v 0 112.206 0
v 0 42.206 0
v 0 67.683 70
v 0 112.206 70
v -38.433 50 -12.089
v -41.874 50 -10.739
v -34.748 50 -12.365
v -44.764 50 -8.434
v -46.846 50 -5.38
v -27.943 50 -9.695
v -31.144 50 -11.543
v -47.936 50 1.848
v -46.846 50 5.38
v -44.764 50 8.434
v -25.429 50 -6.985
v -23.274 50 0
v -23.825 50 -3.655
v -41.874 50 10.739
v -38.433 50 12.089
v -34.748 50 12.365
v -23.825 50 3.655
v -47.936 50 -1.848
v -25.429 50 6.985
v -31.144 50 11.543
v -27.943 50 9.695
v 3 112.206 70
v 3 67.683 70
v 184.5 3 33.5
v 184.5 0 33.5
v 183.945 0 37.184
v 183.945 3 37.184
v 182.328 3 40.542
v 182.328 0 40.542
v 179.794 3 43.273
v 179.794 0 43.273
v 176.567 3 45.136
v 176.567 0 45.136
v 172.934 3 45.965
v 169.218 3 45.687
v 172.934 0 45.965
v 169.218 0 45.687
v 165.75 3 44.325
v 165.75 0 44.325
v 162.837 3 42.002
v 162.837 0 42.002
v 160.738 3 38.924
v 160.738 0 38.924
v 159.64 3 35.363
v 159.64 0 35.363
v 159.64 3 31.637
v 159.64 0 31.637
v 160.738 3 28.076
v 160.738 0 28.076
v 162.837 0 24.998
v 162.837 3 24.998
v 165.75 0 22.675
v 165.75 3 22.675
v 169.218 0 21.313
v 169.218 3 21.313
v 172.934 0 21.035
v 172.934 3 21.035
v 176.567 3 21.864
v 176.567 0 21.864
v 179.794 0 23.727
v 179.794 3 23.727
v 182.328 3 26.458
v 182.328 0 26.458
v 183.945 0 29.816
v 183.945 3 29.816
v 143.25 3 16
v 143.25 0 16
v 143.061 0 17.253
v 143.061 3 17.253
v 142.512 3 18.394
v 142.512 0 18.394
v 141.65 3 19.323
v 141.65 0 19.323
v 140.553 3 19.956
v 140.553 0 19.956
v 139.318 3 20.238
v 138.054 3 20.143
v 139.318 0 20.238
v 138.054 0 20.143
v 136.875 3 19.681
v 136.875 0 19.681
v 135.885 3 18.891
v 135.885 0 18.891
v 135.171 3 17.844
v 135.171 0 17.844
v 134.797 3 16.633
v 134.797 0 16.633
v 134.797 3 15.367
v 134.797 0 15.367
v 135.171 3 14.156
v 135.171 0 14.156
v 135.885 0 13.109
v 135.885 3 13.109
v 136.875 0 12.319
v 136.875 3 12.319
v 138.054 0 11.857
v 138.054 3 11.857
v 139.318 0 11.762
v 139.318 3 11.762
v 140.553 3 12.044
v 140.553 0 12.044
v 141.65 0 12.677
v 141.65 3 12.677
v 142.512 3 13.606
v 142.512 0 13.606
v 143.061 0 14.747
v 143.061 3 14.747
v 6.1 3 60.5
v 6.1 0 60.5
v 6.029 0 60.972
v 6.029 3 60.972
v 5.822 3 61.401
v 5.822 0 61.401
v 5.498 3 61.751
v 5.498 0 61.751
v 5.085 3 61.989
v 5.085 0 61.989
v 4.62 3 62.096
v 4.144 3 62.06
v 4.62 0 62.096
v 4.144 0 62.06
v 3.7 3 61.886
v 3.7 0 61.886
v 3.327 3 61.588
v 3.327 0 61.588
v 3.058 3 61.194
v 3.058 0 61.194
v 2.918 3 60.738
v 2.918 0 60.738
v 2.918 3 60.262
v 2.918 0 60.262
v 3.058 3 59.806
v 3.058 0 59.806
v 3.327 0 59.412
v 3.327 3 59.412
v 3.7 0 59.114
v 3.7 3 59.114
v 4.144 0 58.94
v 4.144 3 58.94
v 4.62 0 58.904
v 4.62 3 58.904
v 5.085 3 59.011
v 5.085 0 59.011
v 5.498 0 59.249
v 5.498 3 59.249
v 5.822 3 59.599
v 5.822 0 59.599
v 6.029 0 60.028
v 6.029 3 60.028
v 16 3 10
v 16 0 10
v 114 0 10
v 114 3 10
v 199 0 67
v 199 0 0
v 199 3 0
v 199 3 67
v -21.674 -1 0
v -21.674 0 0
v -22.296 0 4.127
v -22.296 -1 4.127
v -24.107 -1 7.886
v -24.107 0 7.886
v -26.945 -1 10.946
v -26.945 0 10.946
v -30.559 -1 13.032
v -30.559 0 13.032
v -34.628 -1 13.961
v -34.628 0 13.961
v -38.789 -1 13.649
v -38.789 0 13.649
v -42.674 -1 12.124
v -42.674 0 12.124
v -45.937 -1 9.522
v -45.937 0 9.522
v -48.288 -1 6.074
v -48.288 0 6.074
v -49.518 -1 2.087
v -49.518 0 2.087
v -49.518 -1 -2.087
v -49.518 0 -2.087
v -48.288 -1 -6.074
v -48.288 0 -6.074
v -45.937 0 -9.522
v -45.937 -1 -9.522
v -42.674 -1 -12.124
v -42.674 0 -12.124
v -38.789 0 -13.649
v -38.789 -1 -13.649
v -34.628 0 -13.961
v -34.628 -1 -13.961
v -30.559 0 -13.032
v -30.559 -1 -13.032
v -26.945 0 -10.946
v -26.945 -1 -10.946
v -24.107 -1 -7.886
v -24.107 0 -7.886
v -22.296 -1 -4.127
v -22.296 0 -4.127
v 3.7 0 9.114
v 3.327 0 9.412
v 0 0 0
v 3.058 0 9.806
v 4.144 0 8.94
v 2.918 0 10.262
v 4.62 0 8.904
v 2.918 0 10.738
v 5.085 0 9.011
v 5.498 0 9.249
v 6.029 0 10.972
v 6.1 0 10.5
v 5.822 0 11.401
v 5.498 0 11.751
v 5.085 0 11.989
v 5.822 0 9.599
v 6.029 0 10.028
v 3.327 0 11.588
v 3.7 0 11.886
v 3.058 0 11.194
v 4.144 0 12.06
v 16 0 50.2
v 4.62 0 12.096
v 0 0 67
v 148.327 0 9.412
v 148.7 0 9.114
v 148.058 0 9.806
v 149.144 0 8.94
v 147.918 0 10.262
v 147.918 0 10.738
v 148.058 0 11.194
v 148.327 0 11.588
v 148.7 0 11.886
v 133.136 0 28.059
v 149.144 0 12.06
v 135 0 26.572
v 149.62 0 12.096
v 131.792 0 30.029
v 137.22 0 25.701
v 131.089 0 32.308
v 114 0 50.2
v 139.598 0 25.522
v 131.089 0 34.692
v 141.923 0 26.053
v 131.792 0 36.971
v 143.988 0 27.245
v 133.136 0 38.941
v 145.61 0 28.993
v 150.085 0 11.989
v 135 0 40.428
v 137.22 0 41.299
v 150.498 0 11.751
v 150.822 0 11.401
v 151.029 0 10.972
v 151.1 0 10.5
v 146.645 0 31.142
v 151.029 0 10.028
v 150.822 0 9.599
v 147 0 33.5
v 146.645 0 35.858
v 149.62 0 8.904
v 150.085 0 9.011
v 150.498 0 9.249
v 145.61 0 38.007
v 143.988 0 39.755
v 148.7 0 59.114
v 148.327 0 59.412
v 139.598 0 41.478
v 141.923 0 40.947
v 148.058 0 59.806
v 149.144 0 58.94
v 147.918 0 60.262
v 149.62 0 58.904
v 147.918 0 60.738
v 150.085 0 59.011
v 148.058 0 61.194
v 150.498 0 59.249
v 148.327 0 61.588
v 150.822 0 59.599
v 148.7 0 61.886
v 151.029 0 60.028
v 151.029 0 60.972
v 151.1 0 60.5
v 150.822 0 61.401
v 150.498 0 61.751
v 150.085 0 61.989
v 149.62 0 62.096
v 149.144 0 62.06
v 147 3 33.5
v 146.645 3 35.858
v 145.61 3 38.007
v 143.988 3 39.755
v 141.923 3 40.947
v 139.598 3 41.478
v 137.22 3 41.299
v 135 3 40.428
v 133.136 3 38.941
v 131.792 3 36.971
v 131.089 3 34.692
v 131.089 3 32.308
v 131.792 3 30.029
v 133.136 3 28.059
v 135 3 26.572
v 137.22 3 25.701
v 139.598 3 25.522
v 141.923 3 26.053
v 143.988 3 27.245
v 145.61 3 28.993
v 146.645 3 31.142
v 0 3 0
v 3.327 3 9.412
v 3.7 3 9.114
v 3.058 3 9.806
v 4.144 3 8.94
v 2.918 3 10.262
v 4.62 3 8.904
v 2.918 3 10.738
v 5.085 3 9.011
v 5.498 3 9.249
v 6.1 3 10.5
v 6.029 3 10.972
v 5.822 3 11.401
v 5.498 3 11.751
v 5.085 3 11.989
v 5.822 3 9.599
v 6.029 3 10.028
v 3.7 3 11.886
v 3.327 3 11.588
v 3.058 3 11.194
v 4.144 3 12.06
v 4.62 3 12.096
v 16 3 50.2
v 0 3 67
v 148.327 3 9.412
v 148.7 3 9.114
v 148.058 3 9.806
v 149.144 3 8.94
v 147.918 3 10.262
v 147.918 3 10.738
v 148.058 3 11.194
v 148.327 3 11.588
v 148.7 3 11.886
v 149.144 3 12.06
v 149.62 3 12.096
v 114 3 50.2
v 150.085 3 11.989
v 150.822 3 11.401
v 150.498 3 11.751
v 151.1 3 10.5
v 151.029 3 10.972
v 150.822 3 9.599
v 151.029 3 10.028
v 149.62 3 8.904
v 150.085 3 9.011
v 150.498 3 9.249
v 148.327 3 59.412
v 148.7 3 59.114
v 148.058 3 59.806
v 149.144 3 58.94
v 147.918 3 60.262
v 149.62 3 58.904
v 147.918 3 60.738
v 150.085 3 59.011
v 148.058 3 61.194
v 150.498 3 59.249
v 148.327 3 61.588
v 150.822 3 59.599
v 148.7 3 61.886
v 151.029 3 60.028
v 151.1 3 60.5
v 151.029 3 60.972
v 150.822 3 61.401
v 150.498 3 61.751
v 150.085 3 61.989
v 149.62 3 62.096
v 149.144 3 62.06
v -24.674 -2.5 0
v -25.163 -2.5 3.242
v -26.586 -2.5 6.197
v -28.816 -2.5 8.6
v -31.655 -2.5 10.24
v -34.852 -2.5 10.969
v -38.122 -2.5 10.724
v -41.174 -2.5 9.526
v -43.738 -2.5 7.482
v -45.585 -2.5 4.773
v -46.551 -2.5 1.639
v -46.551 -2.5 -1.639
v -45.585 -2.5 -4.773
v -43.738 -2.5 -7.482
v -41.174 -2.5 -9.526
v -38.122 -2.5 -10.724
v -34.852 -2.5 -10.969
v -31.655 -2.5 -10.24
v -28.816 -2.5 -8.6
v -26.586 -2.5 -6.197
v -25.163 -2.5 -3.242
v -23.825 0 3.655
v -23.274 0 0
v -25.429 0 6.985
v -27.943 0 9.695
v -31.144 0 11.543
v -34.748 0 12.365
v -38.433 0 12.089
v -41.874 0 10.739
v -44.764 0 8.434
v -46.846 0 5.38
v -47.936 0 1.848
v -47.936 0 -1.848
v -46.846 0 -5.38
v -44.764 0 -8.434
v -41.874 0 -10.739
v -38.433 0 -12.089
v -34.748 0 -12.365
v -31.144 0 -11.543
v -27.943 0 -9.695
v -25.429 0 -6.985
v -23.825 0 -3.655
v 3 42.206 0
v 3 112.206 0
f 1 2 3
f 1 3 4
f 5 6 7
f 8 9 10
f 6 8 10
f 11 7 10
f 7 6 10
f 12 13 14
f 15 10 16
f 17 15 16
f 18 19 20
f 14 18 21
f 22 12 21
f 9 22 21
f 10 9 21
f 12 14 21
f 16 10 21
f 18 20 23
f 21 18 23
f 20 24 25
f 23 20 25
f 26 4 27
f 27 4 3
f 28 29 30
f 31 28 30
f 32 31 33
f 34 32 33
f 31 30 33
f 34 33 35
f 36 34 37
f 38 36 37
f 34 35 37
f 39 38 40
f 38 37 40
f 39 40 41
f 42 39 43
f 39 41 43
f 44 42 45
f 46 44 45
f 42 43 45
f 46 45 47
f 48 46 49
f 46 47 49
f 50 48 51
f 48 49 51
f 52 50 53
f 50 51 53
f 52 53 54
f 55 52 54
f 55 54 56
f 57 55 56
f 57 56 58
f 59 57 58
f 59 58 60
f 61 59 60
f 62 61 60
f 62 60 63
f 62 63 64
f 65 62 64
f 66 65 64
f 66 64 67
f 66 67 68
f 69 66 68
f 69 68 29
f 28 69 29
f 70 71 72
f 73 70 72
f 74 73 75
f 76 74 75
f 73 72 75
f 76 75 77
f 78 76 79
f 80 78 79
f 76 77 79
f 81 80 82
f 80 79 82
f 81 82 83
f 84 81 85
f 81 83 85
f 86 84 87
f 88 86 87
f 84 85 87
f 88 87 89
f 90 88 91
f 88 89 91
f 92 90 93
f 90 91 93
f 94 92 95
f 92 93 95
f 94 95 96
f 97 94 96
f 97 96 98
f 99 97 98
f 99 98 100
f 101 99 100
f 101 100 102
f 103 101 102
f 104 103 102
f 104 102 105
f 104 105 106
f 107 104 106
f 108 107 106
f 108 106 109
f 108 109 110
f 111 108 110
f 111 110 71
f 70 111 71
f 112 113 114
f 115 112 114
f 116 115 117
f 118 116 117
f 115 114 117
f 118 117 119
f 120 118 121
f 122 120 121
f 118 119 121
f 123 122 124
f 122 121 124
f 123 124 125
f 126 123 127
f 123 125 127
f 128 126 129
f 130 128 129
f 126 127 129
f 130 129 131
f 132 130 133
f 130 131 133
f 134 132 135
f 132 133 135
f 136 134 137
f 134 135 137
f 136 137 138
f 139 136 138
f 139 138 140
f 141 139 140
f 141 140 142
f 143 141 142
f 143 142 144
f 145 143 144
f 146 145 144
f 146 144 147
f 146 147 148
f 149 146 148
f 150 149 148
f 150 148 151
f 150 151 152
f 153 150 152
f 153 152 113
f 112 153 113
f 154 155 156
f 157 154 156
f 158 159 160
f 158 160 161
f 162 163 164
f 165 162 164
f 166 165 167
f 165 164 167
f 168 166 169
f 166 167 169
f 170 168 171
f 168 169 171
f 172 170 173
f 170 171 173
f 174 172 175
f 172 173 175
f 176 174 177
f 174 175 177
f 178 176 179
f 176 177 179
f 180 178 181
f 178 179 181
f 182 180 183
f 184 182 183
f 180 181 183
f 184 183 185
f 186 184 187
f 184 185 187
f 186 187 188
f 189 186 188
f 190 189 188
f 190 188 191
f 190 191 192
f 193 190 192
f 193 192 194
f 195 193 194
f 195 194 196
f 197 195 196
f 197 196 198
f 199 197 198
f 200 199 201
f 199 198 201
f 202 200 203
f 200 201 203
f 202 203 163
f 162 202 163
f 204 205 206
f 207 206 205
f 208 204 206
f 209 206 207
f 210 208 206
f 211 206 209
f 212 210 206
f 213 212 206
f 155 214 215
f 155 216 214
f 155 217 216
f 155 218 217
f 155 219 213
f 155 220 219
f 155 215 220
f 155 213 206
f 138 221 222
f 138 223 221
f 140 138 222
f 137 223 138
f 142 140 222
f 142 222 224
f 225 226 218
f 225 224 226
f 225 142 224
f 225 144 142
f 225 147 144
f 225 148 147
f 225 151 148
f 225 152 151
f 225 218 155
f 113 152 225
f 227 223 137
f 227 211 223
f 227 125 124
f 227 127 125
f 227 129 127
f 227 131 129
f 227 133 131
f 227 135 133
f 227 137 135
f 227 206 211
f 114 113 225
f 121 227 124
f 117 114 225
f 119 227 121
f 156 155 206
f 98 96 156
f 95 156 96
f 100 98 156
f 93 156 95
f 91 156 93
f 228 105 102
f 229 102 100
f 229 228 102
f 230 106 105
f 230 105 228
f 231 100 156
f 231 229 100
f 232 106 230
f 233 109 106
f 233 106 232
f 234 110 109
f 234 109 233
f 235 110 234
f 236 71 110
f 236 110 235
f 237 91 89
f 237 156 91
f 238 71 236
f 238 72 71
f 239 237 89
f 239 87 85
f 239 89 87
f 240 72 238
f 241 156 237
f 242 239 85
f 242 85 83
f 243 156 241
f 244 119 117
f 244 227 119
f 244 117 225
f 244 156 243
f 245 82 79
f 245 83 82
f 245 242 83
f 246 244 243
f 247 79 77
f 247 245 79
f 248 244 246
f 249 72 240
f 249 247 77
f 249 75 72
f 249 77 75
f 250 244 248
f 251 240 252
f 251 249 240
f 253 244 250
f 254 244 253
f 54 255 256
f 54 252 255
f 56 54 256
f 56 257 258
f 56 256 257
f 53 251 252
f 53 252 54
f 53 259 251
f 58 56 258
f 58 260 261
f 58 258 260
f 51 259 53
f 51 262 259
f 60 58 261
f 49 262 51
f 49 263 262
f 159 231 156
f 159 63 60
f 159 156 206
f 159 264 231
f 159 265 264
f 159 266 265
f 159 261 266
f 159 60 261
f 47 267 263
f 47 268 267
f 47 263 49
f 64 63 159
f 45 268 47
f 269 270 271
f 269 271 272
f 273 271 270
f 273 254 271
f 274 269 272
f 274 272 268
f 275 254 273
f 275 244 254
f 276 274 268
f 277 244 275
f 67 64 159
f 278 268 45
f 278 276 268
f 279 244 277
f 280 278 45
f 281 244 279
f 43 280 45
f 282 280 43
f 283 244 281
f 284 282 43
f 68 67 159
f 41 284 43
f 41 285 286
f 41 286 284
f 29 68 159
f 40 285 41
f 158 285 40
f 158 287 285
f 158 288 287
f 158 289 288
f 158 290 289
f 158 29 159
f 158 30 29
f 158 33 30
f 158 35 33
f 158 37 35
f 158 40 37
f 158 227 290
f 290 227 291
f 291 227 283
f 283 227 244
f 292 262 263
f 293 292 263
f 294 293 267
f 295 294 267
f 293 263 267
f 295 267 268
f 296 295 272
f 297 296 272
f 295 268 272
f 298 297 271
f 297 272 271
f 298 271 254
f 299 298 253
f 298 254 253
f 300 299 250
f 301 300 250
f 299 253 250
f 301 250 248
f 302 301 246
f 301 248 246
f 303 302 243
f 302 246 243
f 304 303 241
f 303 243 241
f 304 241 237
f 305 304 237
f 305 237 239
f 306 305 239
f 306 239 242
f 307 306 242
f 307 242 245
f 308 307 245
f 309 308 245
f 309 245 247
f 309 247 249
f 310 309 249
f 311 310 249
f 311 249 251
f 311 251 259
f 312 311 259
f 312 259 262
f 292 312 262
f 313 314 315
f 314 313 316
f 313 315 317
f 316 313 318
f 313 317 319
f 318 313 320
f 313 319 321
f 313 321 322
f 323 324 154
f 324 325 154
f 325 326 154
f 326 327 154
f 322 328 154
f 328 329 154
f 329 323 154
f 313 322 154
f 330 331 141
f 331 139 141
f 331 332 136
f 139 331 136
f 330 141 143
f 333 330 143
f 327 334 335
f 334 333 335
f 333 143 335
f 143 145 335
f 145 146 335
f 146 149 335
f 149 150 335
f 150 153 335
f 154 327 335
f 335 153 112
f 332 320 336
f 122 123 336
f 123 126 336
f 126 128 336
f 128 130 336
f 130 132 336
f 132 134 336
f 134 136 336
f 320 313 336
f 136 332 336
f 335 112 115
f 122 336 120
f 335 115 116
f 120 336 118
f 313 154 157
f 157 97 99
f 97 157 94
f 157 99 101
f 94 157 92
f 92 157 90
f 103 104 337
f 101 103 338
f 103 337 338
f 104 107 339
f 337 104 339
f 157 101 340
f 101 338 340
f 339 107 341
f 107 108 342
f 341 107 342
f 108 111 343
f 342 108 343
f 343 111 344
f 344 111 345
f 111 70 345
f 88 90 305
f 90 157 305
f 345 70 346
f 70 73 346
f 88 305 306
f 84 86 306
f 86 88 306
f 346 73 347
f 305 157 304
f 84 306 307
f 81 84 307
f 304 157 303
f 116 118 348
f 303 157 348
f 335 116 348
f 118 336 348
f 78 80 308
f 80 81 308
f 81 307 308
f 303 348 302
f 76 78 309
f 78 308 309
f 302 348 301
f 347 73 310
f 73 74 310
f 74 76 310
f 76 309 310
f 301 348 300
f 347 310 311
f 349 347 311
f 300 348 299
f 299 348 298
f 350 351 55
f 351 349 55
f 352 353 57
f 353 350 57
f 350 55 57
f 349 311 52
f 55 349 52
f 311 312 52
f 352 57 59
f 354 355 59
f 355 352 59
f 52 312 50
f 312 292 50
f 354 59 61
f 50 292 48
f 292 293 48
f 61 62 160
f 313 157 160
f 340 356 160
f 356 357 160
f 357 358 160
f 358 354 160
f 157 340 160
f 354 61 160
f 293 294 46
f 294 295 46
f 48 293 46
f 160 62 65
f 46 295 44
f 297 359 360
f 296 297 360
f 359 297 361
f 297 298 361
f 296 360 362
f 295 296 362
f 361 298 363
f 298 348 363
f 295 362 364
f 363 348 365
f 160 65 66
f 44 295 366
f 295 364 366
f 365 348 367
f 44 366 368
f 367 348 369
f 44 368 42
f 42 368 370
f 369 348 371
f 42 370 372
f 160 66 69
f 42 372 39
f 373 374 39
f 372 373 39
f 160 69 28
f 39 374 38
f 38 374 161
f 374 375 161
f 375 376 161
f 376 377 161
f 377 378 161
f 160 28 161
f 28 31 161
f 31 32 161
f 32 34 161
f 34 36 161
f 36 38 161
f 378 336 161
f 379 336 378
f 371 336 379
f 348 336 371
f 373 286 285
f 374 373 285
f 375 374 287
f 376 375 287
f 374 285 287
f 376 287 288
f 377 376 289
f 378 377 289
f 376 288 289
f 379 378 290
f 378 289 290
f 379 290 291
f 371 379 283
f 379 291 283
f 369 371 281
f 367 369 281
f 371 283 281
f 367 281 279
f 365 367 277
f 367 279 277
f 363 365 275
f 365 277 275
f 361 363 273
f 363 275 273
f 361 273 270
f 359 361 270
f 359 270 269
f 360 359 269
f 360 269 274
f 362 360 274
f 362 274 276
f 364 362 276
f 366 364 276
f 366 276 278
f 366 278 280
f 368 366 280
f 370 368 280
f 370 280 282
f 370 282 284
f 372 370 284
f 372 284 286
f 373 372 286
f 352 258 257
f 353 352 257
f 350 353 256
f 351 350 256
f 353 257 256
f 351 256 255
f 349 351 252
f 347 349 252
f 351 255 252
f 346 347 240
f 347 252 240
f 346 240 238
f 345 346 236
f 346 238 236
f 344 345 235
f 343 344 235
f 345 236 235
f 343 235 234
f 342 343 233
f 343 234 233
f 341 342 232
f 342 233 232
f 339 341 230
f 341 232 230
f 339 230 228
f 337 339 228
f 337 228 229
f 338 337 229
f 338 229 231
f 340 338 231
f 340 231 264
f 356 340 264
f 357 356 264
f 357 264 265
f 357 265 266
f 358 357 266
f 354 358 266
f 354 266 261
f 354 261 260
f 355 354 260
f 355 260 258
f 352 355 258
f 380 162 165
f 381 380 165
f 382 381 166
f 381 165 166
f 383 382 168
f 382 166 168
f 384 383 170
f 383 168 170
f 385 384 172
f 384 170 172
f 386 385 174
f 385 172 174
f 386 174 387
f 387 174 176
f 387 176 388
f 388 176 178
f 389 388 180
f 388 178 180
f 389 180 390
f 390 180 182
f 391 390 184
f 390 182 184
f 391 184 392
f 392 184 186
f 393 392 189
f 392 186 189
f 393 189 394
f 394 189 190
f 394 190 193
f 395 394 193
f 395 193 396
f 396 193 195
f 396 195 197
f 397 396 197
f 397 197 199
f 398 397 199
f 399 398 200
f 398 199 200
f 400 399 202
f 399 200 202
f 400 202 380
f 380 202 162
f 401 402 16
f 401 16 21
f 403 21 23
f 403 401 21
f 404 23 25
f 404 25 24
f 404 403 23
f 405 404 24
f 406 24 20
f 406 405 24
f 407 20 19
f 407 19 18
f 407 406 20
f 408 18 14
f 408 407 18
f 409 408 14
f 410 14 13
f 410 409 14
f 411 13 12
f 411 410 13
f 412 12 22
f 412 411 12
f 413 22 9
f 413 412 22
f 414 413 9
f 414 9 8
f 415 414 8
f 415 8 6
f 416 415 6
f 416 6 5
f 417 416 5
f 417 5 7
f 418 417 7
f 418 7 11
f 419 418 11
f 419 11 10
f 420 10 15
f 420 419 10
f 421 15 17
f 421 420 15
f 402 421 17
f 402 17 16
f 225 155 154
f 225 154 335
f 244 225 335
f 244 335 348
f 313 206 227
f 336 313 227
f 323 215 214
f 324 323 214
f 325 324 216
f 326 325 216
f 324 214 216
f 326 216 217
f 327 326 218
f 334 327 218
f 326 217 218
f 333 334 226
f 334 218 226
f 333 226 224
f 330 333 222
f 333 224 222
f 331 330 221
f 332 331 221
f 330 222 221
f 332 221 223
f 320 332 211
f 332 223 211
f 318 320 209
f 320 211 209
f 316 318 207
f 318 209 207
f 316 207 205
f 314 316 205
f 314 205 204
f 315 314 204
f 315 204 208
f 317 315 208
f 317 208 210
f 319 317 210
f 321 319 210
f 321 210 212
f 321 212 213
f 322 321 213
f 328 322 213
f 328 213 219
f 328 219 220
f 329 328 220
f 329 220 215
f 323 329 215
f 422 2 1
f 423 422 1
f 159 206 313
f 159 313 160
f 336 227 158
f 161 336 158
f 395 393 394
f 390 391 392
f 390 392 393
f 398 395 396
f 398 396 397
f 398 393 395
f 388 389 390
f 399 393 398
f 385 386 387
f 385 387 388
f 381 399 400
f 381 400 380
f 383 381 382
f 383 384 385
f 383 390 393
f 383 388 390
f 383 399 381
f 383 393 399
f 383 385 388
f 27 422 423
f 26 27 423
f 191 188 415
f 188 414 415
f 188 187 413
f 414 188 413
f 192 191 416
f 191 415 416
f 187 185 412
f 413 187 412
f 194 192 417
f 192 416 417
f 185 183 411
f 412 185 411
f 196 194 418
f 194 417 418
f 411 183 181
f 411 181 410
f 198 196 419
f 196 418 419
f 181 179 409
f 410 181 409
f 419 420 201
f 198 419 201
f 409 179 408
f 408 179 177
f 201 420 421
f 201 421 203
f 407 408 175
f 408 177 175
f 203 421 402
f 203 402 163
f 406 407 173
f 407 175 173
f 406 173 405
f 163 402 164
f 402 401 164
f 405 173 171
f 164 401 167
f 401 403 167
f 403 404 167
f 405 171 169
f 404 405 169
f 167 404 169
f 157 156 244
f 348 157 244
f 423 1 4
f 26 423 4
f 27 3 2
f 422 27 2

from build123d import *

# Parameters (mm, degrees)
F0_W      = 199
F0_H      = 67
F1_DEPTH  = 3
F2_R      = 1.6
F3_DEPTH  = 3.001
F4_W      = 98
F4_H      = 40.2
F5_DEPTH  = 3.001
F6_R      = 4.25
F6_R_2    = 8
F7_DEPTH  = 3.001
F8_R      = 12.5
F9_DEPTH  = 3.001
F10_R     = 12.4
F11_DEPTH = 50
F12_R     = 14
F13_DEPTH = 2.5
F14_SIZE2 = 1.5
F14_SIZE  = 3
F16_DEPTH = 3


with BuildPart() as f1:
    # F0 (on Front) → F1 (new body)
    with BuildSketch(Plane.XZ):
        with Locations((99.5, 33.5)):
            Rectangle(F0_W, F0_H)
    extrude(amount=-F1_DEPTH)

    # F2 (on face) → F3 (cut, through all)
    with BuildSketch(Plane.XZ):
        with Locations((4.5, 10.5)):
            Circle(F2_R)
        with Locations((4.5, 60.5)):
            Circle(F2_R)
        with Locations((149.5, 10.5)):
            Circle(F2_R)
        with Locations((149.5, 60.5)):
            Circle(F2_R)
    extrude(amount=-F3_DEPTH, mode=Mode.SUBTRACT)

    # F4 (on face) → F5 (cut, through all)
    with BuildSketch(Plane.XZ):
        with Locations((65, 30.1)):
            Rectangle(F4_W, F4_H)
    extrude(amount=-F5_DEPTH, mode=Mode.SUBTRACT)

    # F6 (on face) → F7 (cut, through all)
    with BuildSketch(Plane.XZ):
        with Locations((139, 16)):
            Circle(F6_R)
        with Locations((139, 33.5)):
            Circle(F6_R_2)
    extrude(amount=-F7_DEPTH, mode=Mode.SUBTRACT)

    # F8 (on face) → F9 (cut, through all)
    with BuildSketch(Plane.XZ):
        with Locations((172, 33.5)):
            Circle(F8_R)
    extrude(amount=-F9_DEPTH, mode=Mode.SUBTRACT)


with BuildPart() as f11:
    # F10 (on Front) → F11 (new body)
    with BuildSketch(Plane.XZ):
        with Locations((-35.6742012304, 0)):
            Circle(F10_R)
    extrude(amount=-F11_DEPTH)

    # F12 (on face) → F13 (join)
    with BuildSketch(Plane.XZ):
        with Locations((-35.6742012304, 0)):
            Circle(F12_R)
    extrude(amount=F13_DEPTH)

    # F14
    f14_edges = [f11.edges().sort_by_distance(p)[0] for p in [
        (-49.674201, -2.5, 0),
    ]]
    f14_side = f11.faces().sort_by_distance((-35.674201, -2.5, 0))[0]
    chamfer(f14_edges, length=F14_SIZE, length2=F14_SIZE2, reference=f14_side)


with BuildPart() as f16:
    # F15 (on Right) → F16 (new body)
    with BuildSketch(Plane.YZ):
        Polygon((67.6834460315, 70), (42.2055296329, 0), (112.2055296329, 0), (112.2055296329, 70), align=None)
    extrude(amount=F16_DEPTH)


solid = Compound([f1.part, f11.part, f16.part])
